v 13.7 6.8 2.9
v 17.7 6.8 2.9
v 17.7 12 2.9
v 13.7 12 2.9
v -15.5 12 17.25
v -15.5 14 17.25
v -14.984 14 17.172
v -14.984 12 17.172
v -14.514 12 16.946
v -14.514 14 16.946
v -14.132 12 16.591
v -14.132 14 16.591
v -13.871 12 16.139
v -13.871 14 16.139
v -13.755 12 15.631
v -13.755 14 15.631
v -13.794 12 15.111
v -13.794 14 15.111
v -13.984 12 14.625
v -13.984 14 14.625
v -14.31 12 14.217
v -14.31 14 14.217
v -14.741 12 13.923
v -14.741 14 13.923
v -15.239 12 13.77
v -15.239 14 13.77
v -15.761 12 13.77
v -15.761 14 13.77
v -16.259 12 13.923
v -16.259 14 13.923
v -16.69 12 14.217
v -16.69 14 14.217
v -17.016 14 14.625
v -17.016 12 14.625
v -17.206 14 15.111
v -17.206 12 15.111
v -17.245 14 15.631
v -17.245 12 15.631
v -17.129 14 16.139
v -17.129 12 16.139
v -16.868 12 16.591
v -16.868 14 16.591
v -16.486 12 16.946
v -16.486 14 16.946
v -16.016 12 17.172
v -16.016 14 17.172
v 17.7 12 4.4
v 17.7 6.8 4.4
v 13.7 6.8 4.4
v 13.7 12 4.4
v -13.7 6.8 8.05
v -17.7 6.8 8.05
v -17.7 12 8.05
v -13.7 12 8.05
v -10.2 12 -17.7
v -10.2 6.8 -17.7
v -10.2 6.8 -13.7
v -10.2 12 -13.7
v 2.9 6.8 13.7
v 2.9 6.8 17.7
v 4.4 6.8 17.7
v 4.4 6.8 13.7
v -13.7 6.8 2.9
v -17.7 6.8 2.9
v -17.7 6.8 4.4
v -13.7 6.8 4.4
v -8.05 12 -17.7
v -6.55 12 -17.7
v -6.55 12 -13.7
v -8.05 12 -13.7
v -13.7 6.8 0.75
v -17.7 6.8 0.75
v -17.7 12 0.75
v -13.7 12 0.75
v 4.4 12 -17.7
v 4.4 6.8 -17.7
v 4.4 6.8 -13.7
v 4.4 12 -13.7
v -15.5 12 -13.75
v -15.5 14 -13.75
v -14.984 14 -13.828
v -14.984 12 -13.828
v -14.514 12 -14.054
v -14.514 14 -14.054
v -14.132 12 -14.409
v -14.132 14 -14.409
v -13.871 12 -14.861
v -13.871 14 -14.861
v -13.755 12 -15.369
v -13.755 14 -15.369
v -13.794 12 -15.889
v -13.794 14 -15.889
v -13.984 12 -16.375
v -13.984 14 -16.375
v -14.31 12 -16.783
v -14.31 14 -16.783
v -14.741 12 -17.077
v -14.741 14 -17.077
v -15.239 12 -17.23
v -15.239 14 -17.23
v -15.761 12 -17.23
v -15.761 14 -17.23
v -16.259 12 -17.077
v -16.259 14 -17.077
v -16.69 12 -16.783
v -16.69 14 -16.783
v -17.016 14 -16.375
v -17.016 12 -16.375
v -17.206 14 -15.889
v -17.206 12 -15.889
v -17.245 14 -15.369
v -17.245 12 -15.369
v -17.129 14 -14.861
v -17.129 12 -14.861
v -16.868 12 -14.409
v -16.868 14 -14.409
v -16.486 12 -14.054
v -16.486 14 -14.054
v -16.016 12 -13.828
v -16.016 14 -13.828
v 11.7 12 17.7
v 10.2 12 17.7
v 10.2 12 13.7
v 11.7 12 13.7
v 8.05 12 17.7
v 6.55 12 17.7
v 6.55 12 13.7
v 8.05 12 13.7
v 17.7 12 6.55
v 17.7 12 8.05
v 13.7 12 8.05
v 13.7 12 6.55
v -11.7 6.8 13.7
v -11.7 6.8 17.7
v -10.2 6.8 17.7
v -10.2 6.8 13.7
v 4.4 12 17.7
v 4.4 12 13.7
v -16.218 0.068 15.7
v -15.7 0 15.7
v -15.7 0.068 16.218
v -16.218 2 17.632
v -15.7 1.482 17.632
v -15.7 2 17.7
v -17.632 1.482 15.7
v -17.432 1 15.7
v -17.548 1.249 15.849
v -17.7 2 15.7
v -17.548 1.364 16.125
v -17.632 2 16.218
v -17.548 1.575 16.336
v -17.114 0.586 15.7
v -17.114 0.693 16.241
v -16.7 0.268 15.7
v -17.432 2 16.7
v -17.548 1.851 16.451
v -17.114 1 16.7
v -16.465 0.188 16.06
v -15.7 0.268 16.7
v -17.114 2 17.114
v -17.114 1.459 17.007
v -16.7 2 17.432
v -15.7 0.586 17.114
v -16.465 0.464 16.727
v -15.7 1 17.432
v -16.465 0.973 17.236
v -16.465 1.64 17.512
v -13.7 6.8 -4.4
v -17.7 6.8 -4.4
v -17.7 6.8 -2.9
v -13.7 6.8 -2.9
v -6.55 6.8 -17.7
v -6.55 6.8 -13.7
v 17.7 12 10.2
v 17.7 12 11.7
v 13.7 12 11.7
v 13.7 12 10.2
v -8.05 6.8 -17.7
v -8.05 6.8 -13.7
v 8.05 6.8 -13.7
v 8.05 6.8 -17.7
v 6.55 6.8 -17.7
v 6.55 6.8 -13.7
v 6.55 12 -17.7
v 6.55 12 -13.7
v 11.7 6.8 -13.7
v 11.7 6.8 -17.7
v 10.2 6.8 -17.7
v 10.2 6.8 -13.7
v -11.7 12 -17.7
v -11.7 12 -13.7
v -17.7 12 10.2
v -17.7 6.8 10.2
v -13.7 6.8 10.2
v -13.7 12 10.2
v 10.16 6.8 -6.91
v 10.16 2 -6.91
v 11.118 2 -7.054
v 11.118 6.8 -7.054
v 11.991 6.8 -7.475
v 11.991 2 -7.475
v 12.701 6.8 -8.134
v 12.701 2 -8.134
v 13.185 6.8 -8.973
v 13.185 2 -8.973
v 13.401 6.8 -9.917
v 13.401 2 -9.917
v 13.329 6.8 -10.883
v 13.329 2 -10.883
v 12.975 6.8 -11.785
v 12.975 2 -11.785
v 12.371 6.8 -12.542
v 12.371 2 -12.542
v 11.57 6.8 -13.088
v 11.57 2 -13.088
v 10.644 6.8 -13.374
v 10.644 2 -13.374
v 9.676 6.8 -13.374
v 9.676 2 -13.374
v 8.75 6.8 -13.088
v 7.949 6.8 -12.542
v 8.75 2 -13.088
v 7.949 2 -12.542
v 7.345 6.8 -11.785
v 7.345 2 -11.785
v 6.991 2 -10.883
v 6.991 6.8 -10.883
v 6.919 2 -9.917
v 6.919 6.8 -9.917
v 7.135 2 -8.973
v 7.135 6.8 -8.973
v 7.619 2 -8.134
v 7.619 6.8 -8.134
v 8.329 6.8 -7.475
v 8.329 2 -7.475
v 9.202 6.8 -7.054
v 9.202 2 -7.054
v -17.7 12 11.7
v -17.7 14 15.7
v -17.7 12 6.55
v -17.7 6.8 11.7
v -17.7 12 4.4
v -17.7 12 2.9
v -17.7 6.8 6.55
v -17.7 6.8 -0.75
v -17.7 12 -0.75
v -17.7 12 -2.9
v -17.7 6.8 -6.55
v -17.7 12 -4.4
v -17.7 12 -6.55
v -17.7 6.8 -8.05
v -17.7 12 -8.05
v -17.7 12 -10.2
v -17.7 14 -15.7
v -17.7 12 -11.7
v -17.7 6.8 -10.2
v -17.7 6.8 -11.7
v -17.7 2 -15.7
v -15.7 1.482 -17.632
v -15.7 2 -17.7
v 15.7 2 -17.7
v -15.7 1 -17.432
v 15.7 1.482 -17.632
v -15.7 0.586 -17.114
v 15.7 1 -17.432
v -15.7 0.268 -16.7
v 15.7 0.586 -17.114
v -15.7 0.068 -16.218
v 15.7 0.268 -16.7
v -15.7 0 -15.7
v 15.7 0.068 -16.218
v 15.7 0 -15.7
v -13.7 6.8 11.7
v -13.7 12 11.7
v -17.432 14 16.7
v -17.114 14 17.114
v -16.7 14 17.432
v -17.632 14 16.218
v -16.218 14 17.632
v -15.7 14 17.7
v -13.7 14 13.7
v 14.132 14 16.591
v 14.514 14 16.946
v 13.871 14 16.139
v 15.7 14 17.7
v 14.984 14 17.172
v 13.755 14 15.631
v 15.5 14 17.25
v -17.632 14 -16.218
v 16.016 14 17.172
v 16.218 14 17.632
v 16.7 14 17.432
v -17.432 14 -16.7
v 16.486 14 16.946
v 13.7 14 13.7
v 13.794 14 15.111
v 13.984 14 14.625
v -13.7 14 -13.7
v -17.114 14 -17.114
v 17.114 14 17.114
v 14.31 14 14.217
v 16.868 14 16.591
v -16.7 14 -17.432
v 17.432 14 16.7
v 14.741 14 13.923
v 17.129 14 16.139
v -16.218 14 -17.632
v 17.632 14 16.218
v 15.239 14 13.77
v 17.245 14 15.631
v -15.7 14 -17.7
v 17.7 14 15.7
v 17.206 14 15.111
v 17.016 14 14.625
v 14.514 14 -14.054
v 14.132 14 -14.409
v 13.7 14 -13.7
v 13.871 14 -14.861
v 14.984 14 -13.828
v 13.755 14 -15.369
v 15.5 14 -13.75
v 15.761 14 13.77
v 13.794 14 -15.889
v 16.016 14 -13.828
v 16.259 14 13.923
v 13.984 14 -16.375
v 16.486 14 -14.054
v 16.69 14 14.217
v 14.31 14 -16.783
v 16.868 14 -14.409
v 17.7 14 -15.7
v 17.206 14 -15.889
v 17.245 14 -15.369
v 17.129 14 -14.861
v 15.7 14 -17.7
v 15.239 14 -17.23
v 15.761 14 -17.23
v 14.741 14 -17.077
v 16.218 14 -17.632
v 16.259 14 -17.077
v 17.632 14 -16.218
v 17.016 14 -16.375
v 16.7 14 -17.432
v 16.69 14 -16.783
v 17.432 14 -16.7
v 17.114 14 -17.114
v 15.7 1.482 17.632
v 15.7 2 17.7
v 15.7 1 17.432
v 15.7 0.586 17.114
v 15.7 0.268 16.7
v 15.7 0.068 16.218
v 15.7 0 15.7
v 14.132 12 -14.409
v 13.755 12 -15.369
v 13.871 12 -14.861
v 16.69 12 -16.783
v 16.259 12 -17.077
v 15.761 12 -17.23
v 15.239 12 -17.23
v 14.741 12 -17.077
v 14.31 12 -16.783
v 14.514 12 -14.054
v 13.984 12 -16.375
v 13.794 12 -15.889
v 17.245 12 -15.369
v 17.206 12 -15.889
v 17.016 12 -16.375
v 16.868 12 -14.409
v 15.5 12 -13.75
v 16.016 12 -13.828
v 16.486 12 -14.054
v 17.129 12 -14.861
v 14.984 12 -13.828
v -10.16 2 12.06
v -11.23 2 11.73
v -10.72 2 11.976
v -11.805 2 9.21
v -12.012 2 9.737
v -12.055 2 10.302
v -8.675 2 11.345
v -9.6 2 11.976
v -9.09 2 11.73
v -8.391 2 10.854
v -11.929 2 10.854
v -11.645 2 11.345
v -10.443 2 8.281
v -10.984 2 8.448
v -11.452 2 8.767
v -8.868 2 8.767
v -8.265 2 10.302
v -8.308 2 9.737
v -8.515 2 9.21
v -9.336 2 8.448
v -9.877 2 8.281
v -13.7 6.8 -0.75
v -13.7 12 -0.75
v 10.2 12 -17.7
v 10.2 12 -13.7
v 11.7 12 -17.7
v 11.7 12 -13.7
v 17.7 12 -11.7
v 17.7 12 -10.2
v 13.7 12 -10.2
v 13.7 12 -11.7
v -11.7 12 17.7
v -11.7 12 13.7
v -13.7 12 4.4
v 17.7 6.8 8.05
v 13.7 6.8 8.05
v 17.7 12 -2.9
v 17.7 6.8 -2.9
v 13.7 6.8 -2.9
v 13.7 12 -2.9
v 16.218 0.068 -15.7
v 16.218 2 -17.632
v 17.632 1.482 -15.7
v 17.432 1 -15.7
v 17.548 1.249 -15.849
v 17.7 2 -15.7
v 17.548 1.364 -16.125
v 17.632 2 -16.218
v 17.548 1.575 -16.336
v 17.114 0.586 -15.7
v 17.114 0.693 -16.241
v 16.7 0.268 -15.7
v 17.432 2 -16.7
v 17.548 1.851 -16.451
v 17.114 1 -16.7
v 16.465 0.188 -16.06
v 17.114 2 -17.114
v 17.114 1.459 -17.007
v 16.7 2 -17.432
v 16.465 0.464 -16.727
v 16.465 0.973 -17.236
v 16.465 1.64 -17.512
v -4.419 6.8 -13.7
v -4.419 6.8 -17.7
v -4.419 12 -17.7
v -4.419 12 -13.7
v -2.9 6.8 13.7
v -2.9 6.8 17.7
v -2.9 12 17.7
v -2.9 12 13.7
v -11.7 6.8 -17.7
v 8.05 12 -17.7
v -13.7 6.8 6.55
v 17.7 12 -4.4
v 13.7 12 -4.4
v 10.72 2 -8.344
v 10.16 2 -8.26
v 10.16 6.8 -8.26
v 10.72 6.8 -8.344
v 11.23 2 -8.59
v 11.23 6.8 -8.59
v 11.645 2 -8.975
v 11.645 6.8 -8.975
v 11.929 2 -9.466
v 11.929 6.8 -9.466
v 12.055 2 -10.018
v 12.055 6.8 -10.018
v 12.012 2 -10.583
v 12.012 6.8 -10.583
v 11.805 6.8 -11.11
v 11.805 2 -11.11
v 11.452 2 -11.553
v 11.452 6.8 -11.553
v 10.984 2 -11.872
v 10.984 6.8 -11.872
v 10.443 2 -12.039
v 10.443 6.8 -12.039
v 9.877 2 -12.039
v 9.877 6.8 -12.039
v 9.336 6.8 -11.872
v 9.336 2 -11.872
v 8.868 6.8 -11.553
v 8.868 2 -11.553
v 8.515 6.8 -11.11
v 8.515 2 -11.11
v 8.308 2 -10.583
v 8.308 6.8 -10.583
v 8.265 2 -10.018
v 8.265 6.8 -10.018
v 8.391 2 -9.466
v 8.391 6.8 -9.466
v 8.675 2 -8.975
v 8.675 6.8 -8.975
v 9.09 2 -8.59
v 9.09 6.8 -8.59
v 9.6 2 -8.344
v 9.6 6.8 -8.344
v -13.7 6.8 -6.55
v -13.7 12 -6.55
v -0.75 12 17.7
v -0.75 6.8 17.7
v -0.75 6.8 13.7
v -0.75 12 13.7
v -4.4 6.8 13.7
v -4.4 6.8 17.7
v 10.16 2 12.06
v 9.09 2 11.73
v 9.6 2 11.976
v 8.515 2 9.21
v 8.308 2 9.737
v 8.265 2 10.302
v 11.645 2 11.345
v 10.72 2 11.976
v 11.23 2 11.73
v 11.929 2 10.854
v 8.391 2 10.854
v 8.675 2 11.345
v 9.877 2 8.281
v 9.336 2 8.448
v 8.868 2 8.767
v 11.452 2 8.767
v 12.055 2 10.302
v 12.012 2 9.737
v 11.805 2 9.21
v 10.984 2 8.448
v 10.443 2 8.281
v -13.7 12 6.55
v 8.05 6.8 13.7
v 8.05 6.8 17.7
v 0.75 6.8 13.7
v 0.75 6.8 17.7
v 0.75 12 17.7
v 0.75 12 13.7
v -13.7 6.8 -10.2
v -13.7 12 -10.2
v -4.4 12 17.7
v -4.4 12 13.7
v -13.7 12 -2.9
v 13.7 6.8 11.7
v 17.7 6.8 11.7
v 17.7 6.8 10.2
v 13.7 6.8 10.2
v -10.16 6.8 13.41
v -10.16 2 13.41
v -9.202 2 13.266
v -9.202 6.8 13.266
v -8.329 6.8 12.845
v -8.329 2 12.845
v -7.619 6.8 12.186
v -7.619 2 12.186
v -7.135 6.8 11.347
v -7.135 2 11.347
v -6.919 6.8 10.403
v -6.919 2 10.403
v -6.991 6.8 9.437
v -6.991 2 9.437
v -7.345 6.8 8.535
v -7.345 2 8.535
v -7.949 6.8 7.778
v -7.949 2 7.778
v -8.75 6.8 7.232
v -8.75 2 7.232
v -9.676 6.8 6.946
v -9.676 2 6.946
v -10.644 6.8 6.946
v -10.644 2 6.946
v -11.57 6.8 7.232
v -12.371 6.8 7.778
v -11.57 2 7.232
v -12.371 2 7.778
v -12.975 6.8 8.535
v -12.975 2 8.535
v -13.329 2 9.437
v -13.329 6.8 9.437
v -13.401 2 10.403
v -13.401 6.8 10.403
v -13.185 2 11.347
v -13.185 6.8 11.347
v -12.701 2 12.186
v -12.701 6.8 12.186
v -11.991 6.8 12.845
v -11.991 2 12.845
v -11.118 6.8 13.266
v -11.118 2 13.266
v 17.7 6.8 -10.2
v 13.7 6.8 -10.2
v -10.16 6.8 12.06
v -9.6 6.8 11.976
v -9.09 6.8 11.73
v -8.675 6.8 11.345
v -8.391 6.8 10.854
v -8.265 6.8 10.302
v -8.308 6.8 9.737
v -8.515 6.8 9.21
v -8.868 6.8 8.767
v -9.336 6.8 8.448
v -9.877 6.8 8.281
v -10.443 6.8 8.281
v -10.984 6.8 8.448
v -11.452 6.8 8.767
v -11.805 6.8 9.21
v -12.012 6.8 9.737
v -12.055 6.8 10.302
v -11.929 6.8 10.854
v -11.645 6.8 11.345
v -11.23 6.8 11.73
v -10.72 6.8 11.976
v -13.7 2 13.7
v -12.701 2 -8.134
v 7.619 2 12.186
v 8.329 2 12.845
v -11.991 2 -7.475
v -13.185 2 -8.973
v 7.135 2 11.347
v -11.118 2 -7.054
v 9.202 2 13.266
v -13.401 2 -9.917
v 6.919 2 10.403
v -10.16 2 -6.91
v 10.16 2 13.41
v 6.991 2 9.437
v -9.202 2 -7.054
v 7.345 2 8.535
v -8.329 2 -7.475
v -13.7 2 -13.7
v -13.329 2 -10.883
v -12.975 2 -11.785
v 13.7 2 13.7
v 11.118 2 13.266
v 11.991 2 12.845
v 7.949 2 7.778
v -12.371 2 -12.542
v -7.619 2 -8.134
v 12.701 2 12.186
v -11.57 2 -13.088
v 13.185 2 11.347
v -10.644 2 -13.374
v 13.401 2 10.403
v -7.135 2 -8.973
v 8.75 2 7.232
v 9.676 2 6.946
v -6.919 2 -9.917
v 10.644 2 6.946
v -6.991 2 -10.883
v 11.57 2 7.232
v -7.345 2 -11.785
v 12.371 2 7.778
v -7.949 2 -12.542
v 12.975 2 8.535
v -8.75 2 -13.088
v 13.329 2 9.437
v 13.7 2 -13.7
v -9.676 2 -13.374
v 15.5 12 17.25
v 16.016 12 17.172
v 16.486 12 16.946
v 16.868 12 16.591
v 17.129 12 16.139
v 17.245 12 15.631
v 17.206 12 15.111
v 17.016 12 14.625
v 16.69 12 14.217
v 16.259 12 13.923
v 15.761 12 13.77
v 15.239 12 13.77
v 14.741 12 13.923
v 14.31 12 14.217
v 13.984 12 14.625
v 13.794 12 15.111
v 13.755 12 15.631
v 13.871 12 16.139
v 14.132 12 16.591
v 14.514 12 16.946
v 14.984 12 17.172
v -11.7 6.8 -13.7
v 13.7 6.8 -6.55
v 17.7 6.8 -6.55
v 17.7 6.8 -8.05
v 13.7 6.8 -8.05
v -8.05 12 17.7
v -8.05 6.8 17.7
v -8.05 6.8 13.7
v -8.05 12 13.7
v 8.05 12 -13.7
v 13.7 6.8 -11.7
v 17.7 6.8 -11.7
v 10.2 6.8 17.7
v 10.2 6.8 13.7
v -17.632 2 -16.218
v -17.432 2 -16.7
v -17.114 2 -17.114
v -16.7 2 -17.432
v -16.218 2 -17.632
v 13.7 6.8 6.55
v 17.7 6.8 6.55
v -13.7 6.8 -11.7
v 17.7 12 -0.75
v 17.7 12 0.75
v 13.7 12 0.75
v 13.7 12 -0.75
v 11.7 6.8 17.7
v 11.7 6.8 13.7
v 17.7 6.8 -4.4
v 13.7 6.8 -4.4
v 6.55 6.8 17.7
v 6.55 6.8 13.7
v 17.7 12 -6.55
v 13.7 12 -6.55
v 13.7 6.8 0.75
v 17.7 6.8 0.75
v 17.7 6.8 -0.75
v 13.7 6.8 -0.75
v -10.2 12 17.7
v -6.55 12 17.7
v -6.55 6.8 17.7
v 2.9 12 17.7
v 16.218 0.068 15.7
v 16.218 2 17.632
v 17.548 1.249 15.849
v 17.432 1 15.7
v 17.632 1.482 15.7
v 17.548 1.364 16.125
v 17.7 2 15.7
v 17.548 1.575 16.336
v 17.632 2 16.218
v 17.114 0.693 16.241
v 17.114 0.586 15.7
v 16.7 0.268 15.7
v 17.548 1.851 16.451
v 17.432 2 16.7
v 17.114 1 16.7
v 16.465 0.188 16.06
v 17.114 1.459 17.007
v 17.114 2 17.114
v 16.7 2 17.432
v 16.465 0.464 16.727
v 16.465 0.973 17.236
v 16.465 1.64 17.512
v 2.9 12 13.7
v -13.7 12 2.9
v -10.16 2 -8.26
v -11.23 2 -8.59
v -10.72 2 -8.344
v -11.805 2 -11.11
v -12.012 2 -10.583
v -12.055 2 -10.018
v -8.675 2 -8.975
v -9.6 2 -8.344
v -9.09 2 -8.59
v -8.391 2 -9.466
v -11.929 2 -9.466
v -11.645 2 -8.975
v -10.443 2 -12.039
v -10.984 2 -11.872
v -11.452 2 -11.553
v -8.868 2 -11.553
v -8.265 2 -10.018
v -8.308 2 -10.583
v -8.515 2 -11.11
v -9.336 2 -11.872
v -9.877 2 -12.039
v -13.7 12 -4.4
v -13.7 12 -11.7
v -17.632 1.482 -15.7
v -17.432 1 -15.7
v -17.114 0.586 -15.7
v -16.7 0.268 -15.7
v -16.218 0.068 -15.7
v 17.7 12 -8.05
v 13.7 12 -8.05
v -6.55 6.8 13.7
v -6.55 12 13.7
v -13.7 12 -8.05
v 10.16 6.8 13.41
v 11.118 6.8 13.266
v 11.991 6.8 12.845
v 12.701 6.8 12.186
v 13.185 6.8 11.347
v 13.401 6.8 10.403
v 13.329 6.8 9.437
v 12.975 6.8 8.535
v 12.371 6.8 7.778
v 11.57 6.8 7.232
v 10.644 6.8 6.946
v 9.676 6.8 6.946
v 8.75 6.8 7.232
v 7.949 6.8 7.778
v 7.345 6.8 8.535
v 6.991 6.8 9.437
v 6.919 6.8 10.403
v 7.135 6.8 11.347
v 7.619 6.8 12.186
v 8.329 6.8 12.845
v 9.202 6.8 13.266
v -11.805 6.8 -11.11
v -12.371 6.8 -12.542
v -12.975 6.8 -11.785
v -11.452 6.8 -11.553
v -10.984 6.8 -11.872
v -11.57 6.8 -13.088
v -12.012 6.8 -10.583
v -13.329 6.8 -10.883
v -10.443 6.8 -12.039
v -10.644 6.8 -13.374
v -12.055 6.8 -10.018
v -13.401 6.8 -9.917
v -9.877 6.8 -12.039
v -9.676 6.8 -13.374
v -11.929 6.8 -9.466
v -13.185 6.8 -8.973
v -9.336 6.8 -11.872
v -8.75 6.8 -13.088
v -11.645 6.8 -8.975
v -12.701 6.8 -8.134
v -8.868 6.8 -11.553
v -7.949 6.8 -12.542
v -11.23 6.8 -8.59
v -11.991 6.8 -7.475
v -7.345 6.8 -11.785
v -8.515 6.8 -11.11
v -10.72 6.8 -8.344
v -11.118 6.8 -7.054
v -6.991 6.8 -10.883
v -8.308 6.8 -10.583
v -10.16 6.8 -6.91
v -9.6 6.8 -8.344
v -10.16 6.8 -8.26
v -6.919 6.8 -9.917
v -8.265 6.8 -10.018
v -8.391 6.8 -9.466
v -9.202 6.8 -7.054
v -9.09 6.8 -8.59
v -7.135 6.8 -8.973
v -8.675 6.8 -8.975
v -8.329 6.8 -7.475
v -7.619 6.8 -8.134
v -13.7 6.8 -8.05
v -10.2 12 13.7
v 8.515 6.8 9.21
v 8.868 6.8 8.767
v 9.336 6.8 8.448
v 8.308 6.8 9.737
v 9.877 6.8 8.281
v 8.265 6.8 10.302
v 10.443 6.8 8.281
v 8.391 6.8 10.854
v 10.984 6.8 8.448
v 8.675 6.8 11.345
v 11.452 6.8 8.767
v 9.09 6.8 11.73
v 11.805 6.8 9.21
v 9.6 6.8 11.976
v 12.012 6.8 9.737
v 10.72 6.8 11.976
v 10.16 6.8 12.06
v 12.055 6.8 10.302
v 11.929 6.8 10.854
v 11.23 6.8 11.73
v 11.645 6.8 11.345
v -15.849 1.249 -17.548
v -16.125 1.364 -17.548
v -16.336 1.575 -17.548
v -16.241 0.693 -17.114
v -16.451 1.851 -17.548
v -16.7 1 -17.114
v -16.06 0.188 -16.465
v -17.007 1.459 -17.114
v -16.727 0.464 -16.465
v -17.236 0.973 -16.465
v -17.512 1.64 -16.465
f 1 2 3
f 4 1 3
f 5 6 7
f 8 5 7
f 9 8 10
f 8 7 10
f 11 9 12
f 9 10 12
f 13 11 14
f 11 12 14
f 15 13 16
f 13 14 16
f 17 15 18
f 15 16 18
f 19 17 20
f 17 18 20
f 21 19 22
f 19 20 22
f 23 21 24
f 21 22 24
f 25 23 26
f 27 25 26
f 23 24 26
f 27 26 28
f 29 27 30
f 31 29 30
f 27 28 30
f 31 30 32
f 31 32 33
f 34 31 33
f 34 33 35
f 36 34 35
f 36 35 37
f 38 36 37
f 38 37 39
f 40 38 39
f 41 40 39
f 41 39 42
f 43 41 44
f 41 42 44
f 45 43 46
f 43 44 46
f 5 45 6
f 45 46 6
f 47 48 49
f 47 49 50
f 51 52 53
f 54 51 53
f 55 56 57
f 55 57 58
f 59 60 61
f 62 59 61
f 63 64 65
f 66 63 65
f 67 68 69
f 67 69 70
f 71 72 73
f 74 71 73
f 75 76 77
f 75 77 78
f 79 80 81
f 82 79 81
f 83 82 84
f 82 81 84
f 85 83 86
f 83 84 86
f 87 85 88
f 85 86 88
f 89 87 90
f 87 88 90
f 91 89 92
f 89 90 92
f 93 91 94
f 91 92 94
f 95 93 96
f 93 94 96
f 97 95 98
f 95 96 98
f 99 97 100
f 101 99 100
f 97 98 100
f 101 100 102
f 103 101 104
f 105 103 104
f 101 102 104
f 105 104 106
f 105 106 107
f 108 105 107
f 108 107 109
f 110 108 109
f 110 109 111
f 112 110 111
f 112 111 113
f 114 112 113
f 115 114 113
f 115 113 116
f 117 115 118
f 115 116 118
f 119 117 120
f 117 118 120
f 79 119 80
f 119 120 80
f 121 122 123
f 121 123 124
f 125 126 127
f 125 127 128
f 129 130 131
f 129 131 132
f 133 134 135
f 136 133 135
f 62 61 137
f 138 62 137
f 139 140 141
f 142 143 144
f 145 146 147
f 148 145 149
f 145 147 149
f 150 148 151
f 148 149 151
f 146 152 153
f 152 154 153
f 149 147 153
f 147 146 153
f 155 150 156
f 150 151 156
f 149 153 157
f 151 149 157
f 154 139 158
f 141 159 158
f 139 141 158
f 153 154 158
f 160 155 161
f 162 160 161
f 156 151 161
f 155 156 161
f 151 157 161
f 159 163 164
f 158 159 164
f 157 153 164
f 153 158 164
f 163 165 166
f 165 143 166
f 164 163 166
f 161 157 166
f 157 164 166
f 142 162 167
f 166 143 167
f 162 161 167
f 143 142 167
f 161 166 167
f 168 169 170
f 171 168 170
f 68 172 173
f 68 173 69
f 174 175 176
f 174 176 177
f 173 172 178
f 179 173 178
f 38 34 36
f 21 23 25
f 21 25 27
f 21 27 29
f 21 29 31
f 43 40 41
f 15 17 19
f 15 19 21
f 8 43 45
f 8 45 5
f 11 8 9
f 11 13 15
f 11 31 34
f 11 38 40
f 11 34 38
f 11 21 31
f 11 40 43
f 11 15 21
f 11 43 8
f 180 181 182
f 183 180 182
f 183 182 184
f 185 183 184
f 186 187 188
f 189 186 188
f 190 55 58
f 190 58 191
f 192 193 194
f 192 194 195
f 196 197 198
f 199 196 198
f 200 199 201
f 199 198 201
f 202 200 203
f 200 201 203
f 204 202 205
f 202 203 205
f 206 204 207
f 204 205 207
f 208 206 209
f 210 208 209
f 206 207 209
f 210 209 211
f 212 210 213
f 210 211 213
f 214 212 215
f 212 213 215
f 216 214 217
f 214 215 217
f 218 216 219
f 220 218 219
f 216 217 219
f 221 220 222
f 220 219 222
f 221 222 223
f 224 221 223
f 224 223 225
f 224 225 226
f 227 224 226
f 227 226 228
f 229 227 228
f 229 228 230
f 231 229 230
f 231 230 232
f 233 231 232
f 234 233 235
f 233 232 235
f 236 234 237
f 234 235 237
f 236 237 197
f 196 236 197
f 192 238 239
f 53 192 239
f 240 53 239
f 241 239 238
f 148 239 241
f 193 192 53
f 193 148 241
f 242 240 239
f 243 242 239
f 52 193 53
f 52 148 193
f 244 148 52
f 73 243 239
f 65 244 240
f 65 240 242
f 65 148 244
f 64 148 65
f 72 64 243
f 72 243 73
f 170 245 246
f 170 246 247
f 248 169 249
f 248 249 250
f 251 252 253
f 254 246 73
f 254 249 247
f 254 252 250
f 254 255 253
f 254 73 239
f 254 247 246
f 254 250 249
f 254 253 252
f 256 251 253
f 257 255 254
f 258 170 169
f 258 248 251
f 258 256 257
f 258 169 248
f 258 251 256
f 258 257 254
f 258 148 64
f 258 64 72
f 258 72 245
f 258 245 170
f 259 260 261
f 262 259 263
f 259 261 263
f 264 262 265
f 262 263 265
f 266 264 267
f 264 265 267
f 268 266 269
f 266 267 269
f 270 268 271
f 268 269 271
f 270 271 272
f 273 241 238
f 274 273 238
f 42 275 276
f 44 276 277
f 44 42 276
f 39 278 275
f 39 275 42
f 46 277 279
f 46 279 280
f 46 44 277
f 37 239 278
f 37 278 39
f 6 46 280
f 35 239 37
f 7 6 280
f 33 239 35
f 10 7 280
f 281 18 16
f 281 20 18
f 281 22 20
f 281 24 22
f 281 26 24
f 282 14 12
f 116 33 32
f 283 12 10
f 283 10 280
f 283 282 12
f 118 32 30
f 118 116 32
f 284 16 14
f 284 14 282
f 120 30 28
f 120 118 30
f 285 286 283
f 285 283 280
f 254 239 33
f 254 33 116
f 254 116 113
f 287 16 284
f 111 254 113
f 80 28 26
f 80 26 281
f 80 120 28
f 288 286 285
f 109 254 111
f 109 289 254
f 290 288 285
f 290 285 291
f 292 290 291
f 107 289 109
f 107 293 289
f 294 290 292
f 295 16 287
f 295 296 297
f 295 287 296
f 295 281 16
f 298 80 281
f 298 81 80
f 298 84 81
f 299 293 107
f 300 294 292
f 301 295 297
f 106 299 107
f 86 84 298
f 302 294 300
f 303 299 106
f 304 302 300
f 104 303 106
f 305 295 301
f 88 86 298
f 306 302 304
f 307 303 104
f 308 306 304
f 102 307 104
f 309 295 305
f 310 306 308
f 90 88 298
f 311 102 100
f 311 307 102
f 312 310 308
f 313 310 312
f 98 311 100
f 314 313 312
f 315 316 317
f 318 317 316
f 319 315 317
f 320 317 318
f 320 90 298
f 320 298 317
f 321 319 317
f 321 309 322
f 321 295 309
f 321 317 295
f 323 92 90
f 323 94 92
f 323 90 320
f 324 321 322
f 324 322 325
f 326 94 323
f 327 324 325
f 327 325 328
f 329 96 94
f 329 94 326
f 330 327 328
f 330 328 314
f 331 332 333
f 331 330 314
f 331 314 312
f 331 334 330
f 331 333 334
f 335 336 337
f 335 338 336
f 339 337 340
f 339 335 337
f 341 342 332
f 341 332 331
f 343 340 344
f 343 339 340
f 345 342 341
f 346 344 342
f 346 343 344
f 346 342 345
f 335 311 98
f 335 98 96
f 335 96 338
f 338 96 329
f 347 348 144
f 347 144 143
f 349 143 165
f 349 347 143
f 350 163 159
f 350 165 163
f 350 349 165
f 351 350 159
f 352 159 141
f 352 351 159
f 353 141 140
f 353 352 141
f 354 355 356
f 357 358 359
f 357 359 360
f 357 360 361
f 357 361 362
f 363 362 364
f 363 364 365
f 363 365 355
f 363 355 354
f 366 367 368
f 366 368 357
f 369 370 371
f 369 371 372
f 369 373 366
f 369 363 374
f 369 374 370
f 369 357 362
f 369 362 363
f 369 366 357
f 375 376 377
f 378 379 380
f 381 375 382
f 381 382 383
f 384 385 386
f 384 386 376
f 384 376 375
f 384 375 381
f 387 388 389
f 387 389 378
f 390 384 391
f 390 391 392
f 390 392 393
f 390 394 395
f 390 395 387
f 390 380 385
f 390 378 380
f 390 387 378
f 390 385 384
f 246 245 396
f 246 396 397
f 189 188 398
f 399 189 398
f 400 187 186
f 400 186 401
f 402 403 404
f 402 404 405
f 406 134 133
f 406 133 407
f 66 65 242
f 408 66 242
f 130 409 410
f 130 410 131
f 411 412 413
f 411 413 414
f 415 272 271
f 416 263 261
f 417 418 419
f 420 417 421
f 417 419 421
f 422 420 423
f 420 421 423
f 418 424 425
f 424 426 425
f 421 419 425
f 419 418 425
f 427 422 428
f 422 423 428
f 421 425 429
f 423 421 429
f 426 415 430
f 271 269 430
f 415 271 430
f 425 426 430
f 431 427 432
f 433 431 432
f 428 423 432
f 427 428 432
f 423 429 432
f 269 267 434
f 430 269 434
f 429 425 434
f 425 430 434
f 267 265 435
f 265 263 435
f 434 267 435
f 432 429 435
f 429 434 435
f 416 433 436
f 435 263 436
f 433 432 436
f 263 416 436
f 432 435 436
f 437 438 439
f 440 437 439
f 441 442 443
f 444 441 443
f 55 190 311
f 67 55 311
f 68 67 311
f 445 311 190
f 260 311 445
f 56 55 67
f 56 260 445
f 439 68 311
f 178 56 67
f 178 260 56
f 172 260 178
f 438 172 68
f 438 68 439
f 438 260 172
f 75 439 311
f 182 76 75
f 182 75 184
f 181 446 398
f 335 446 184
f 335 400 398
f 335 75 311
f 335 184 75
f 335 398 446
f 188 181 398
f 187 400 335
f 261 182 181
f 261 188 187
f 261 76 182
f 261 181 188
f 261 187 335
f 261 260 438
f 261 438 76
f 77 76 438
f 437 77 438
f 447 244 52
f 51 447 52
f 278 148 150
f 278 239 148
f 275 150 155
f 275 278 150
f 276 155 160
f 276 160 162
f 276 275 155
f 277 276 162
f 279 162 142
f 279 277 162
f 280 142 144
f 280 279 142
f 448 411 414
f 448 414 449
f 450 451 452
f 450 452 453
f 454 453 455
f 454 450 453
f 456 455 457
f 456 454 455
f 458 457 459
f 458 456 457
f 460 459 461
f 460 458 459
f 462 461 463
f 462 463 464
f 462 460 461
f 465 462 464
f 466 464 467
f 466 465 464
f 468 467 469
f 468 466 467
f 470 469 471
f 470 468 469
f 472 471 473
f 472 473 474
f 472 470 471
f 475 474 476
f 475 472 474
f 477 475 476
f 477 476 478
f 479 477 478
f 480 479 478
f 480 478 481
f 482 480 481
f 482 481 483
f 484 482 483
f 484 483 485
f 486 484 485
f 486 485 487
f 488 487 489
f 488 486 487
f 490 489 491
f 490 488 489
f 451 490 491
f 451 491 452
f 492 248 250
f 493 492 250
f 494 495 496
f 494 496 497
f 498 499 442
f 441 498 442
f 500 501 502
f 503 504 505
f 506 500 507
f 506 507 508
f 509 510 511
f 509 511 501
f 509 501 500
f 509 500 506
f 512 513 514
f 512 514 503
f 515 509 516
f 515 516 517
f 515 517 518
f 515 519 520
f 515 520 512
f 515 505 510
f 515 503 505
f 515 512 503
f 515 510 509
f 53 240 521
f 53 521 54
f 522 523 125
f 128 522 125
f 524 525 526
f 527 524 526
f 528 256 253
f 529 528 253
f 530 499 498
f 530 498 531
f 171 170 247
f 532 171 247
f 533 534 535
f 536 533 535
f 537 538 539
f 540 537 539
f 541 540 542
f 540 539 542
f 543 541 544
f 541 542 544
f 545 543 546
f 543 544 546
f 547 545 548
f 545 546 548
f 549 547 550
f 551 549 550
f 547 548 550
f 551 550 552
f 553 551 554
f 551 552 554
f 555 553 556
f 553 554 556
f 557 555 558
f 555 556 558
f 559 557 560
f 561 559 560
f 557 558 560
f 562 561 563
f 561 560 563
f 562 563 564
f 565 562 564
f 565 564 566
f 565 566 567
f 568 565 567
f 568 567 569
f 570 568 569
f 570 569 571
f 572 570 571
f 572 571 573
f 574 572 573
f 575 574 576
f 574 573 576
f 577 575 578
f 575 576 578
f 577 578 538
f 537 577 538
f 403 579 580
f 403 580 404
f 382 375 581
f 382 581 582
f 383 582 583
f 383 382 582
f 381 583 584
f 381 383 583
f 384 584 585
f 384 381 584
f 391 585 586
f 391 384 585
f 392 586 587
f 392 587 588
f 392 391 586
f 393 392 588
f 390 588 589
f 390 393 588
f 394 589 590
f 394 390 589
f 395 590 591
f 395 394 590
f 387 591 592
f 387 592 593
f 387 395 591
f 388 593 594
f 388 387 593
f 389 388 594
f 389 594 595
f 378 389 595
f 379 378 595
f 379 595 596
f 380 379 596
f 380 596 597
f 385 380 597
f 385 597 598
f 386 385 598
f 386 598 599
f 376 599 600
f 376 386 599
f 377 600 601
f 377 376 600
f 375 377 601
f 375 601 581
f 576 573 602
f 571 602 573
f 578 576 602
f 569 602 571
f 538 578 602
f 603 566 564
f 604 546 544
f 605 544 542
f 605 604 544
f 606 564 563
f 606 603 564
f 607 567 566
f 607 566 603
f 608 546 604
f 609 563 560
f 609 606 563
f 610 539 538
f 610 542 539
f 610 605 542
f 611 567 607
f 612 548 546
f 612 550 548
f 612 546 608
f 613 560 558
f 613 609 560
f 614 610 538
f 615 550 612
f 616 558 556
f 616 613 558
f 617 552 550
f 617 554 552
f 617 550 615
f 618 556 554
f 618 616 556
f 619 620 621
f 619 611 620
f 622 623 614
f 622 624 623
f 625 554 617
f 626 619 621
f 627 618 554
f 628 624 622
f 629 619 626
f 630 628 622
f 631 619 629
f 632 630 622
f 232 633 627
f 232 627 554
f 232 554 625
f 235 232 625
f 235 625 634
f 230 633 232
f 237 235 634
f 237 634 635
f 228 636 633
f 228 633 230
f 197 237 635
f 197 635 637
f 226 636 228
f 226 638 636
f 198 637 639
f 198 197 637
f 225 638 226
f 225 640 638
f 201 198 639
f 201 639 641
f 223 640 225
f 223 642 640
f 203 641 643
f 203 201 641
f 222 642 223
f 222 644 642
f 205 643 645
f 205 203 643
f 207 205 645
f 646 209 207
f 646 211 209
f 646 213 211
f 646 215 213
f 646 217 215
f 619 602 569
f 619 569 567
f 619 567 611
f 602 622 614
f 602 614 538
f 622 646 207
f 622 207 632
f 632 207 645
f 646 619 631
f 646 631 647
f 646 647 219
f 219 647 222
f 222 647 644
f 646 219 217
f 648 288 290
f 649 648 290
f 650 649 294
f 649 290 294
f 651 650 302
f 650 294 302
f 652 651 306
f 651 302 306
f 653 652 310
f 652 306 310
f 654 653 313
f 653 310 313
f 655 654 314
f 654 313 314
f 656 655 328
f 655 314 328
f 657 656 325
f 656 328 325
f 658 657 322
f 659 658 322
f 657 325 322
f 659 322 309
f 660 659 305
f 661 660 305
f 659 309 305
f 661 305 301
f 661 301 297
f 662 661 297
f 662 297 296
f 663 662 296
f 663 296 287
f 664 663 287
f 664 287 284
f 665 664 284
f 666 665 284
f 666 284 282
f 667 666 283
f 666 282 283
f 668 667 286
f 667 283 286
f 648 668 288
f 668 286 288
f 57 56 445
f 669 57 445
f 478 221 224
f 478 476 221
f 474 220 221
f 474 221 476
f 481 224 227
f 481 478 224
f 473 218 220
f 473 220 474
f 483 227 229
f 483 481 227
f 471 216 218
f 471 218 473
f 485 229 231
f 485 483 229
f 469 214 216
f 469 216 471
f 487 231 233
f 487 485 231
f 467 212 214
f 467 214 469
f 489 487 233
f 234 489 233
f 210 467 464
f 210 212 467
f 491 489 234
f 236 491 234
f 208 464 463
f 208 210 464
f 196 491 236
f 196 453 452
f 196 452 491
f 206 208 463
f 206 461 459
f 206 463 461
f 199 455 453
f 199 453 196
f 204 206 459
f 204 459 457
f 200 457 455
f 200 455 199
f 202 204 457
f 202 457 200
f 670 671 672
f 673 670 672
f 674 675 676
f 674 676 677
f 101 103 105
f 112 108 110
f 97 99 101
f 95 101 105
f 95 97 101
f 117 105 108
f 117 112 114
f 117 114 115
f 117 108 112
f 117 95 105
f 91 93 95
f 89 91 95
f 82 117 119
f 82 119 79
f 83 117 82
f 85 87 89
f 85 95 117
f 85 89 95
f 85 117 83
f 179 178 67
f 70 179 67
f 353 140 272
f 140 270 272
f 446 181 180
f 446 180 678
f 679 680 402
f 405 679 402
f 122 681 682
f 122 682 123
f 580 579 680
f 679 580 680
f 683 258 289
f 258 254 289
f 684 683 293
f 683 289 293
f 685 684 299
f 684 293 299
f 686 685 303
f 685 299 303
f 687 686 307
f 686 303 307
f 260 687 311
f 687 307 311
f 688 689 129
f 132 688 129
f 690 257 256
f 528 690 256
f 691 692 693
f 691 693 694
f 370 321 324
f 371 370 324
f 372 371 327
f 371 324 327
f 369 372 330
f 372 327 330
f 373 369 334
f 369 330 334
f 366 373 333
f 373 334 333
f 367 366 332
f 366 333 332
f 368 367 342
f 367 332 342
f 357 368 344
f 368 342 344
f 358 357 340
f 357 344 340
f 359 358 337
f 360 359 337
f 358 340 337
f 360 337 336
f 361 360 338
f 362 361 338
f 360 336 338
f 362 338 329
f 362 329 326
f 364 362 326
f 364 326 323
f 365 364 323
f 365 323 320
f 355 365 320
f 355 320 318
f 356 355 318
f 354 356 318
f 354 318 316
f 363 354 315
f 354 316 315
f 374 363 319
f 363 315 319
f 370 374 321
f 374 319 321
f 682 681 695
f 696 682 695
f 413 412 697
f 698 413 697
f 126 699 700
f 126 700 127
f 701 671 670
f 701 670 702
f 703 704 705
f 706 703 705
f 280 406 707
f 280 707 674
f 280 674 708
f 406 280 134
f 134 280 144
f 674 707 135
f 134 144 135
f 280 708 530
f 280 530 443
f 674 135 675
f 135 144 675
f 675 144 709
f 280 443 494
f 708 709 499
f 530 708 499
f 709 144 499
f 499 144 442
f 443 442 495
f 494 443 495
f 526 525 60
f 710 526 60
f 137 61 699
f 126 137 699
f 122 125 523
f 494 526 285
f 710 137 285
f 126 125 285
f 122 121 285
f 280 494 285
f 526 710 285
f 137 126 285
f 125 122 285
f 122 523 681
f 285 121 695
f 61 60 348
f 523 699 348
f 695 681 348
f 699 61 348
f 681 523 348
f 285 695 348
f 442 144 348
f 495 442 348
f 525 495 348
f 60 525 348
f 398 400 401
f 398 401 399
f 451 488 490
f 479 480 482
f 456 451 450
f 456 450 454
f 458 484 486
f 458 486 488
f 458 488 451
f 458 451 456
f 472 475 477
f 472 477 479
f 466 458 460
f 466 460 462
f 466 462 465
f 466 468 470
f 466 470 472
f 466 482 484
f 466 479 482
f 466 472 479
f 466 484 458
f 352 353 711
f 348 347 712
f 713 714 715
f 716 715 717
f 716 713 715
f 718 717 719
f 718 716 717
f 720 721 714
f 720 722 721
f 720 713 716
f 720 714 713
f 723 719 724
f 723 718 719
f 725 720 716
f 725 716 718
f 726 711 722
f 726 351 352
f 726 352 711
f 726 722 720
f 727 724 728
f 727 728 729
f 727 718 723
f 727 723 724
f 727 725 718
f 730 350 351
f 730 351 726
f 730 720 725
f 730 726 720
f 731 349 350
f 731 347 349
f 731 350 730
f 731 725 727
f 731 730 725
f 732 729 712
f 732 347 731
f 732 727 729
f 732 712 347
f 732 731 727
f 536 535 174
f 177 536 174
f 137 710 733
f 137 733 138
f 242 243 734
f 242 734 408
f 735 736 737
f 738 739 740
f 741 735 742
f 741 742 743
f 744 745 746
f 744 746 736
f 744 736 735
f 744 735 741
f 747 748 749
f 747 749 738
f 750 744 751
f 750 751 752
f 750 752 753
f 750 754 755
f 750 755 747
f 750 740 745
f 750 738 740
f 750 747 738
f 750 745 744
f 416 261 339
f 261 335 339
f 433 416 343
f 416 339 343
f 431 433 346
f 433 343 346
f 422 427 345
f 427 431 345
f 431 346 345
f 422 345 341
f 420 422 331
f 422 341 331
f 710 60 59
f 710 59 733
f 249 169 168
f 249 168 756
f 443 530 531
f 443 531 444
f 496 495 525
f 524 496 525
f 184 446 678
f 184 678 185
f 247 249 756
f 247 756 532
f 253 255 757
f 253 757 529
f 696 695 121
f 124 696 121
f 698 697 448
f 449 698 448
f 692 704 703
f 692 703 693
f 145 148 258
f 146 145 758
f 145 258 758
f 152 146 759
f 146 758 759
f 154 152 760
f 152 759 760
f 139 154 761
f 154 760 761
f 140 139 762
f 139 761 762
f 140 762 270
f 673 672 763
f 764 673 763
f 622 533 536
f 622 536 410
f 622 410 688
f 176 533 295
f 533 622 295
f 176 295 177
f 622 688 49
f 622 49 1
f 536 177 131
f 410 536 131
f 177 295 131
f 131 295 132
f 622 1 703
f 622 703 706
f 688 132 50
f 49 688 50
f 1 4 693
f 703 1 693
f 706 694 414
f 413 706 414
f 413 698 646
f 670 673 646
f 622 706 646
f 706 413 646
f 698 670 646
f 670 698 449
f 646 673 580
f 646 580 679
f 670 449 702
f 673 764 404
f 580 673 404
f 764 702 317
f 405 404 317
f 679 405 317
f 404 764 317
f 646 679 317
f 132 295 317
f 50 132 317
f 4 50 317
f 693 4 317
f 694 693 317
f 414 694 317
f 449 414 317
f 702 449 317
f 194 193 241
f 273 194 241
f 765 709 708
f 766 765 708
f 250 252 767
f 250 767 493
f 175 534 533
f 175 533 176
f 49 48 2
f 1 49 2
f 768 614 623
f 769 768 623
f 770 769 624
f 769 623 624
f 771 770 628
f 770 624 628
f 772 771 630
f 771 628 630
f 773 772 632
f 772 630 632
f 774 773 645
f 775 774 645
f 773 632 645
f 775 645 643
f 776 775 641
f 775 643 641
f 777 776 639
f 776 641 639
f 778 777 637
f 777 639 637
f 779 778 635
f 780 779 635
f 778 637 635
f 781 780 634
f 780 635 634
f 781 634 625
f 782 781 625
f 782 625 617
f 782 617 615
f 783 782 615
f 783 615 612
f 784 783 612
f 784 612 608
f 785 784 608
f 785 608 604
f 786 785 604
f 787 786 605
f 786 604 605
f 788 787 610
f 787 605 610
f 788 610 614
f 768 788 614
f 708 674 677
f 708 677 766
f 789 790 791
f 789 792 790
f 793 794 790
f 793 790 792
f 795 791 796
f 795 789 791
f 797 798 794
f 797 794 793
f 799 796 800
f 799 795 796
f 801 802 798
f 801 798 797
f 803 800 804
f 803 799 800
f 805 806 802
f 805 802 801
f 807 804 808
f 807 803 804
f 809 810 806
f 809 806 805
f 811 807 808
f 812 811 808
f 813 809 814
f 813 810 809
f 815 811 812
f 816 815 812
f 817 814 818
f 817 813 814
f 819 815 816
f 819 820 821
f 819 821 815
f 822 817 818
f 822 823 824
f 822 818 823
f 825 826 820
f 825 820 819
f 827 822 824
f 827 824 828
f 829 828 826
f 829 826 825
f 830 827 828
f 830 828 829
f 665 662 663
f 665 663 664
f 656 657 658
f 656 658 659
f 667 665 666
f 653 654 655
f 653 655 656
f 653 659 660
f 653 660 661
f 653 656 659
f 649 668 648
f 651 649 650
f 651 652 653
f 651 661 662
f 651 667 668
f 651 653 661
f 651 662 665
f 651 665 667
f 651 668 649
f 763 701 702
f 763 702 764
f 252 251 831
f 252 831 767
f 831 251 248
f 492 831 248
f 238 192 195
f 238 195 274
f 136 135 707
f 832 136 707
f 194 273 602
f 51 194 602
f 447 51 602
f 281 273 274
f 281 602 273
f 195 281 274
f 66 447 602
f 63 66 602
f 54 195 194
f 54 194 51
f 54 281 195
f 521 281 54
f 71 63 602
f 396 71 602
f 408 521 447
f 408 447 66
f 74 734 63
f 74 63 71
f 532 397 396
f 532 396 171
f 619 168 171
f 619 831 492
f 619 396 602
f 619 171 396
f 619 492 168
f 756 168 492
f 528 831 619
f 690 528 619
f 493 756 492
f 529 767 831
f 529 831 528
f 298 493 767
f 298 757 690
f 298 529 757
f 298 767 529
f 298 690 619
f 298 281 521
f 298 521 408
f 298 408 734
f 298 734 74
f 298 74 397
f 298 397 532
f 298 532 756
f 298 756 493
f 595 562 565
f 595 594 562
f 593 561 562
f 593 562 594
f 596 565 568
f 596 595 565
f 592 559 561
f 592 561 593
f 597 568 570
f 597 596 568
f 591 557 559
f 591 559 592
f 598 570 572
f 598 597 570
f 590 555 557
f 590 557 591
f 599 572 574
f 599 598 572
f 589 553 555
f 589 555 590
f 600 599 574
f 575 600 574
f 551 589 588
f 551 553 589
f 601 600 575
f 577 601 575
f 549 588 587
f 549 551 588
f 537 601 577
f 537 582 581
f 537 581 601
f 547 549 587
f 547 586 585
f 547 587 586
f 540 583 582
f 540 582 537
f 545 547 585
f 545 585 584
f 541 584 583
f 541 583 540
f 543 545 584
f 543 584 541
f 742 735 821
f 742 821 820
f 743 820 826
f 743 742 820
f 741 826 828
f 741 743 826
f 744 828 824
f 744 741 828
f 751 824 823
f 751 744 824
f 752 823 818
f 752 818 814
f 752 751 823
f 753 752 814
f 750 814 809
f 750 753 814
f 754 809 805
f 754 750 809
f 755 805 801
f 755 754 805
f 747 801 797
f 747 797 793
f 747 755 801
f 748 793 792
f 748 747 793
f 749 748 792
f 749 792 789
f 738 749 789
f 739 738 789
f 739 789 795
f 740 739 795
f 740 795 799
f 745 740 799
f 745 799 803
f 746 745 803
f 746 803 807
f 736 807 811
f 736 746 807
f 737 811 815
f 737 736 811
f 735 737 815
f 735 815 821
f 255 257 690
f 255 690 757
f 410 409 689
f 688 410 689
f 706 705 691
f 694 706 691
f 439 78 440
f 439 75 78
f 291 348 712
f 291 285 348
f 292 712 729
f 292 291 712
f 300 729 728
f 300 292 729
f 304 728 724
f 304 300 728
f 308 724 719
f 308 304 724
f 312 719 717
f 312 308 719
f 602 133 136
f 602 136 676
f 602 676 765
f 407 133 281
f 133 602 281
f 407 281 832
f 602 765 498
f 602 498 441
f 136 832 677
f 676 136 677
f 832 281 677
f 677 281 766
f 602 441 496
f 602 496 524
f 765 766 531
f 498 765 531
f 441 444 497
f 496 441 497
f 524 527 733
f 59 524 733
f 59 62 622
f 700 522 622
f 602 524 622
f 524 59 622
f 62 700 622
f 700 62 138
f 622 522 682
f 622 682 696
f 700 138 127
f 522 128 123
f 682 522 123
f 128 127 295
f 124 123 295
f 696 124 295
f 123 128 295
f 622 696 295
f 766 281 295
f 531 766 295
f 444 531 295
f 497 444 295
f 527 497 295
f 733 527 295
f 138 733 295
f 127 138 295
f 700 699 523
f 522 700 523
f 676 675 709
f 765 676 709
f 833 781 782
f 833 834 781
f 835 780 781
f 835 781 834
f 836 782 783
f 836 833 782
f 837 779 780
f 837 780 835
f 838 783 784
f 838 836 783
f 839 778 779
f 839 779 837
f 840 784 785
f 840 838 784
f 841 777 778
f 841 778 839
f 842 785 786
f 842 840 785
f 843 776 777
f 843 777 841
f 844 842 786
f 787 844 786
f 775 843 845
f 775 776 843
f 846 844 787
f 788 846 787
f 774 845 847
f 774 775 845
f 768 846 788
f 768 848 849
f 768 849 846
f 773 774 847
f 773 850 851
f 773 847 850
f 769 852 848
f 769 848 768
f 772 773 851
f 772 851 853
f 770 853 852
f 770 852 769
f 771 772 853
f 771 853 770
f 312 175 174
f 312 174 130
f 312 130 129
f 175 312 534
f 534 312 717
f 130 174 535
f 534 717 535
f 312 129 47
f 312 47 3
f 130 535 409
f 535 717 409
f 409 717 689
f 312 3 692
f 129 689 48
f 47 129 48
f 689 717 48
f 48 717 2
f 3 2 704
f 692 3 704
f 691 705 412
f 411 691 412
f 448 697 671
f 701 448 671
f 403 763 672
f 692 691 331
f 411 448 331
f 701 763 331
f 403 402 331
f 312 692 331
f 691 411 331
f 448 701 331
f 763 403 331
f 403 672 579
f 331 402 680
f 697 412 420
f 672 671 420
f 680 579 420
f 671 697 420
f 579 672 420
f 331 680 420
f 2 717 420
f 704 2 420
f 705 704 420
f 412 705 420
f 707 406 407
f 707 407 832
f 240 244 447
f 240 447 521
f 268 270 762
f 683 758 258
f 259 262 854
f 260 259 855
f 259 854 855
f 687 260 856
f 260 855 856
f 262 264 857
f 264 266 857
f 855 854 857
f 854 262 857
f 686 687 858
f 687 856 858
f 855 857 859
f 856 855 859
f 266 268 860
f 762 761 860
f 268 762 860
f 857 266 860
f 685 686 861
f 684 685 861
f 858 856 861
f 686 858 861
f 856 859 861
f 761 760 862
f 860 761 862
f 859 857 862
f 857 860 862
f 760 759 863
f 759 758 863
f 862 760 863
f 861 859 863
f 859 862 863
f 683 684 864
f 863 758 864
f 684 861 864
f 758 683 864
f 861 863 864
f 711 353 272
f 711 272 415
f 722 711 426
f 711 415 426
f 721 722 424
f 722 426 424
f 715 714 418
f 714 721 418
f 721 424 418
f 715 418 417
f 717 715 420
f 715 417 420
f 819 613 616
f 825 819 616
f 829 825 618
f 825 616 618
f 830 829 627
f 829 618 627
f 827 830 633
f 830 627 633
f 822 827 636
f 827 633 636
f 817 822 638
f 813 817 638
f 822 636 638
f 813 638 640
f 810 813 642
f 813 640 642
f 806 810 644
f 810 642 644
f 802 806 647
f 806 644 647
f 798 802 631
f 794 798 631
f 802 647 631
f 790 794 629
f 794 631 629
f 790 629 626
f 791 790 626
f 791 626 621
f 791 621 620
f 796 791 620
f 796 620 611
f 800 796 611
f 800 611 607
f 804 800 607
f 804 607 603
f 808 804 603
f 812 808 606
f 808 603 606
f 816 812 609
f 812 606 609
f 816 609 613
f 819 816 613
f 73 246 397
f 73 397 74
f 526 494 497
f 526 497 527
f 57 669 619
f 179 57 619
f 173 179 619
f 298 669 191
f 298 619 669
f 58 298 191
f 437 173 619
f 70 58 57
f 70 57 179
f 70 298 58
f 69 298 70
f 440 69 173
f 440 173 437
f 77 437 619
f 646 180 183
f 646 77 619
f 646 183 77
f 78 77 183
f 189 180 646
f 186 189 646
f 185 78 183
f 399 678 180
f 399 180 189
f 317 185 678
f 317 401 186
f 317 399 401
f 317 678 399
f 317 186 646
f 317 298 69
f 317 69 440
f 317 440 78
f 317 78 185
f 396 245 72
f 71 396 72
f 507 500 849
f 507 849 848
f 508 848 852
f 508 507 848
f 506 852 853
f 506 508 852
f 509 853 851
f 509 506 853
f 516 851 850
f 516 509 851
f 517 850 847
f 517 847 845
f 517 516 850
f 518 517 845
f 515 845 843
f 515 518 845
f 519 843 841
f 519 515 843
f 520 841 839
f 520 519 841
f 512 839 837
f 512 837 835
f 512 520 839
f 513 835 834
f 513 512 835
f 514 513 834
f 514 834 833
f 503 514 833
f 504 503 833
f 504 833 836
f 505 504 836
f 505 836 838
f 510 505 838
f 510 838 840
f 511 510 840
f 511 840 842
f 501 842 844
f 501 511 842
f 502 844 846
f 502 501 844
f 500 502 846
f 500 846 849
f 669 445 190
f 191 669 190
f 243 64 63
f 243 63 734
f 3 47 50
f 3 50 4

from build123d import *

# Parameters (mm, degrees)
ESQUISSE1_W              = 35.4
ESQUISSE1_H              = 35.4
BOSS_EXTRU_1_DEPTH       = 14
ESQUISSE2_W              = 27.4
ESQUISSE2_H              = 27.4
ENL_V_MAT_EXTRU_1_DEPTH  = 12
ESQUISSE4_R              = 3.25
ESQUISSE4_R_2            = 1.9
BOSS_EXTRU_2_DEPTH       = 4.8
ESQUISSE5_R              = 1.75
ENL_V_MAT_EXTRU_2_DEPTH  = 2
CONG_6_R                 = 2
ESQUISSE9_W              = 1.5
ESQUISSE9_H              = 5.2
ENL_V_MAT_EXTRU_9_DEPTH  = 4
ESQUISSE8_W              = 1.5
ESQUISSE8_H              = 5.2
ENL_V_MAT_EXTRU_10_DEPTH = 4
ESQUISSE7_W              = 1.5
ESQUISSE7_H              = 5.2
ENL_V_MAT_EXTRU_11_DEPTH = 4
ESQUISSE6_W              = 1.5
ESQUISSE6_H              = 5.2
ENL_V_MAT_EXTRU_12_DEPTH = 4
ESQUISSE10_W             = 8.819289119
ESQUISSE10_H             = 5.2
ENL_V_MAT_EXTRU_13_DEPTH = 6


with BuildPart() as part:
    # Esquisse1 → Boss.-Extru.1 (new body)
    with BuildSketch(Plane(origin=(0, 0, 0), x_dir=(1, 0, 0), z_dir=(0, 1, 0))):
        Rectangle(ESQUISSE1_W, ESQUISSE1_H)
    extrude(amount=BOSS_EXTRU_1_DEPTH)

    # Esquisse2 → Enlèv. mat.-Extru.1 (cut)
    with BuildSketch(Plane(origin=(0, 14, 0), x_dir=(1, 0, 0), z_dir=(0, 1, 0))):
        Rectangle(ESQUISSE2_W, ESQUISSE2_H)
    extrude(amount=-ENL_V_MAT_EXTRU_1_DEPTH, mode=Mode.SUBTRACT)

    # Esquisse4 → Boss.-Extru.2 (add)
    # profile 1 of 4: a face of its own
    with BuildSketch(Plane(origin=(0, 2, 0), x_dir=(1, 0, 0), z_dir=(0, 1, 0))):
        with Locations(Location((-10.16, 10.16, 0), (0, 0, 270))):
            Circle(ESQUISSE4_R)
        with Locations(Location((-10.16, 10.16, 0), (0, 0, 270))):
            Circle(ESQUISSE4_R_2, mode=Mode.SUBTRACT)
    # profile 2 of 4: a face of its own
    with BuildSketch(Plane(origin=(0, 2, 0), x_dir=(1, 0, 0), z_dir=(0, 1, 0))):
        with Locations(Location((10.16, 10.16, 0), (0, 0, 270))):
            Circle(ESQUISSE4_R)
        with Locations(Location((10.16, 10.16, 0), (0, 0, 270))):
            Circle(ESQUISSE4_R_2, mode=Mode.SUBTRACT)
    # profile 3 of 4: a face of its own
    with BuildSketch(Plane(origin=(0, 2, 0), x_dir=(1, 0, 0), z_dir=(0, 1, 0))):
        with Locations(Location((10.16, -10.16, 0), (0, 0, 270))):
            Circle(ESQUISSE4_R)
        with Locations(Location((10.16, -10.16, 0), (0, 0, 270))):
            Circle(ESQUISSE4_R_2, mode=Mode.SUBTRACT)
    # profile 4 of 4: a face of its own
    with BuildSketch(Plane(origin=(0, 2, 0), x_dir=(1, 0, 0), z_dir=(0, 1, 0))):
        with Locations(Location((-10.16, -10.16, 0), (0, 0, 270))):
            Circle(ESQUISSE4_R)
        with Locations(Location((-10.16, -10.16, 0), (0, 0, 270))):
            Circle(ESQUISSE4_R_2, mode=Mode.SUBTRACT)
    extrude(amount=BOSS_EXTRU_2_DEPTH)

    # Esquisse5 → Enlèv. mat.-Extru.2 (cut)
    with BuildSketch(Plane(origin=(0, 14, 0), x_dir=(1, 0, 0), z_dir=(0, 1, 0))):
        with Locations(Location((15.5, 15.5, 0), (0, 0, 270))):
            Circle(ESQUISSE5_R)
        with Locations(Location((-15.5, 15.5, 0), (0, 0, 270))):
            Circle(ESQUISSE5_R)
        with Locations(Location((-15.5, -15.5, 0), (0, 0, 270))):
            Circle(ESQUISSE5_R)
        with Locations(Location((15.5, -15.5, 0), (0, 0, 270))):
            Circle(ESQUISSE5_R)
    extrude(amount=-ENL_V_MAT_EXTRU_2_DEPTH, mode=Mode.SUBTRACT)

    # Congé6
    cong_6_edges = [part.edges().sort_by_distance(p)[0] for p in [
        (0, 0, 17.7),
        (-17.7, 0, 0),
        (0, 0, -17.7),
        (17.7, 0, 0),
        (17.7, 7, 17.7),
        (-17.7, 7, 17.7),
        (-17.7, 7, -17.7),
        (17.7, 7, -17.7),
    ]]
    fillet(cong_6_edges, radius=CONG_6_R)

    # Esquisse9 → Enlèv. mat.-Extru.9 (cut)
    with BuildSketch(Plane(origin=(0, 0, -17.7), x_dir=(-1, 0, 0), z_dir=(0, 0, -1))):
        with Locations((-10.95, 9.4)):
            Rectangle(ESQUISSE9_W, ESQUISSE9_H)
        with Locations((-7.3, 9.4)):
            Rectangle(ESQUISSE9_W, ESQUISSE9_H)
        with Locations((-3.65, 9.4)):
            Rectangle(ESQUISSE9_W, ESQUISSE9_H)
        with Locations((0, 9.4)):
            Rectangle(ESQUISSE9_W, ESQUISSE9_H)
        with Locations((3.65, 9.4)):
            Rectangle(ESQUISSE9_W, ESQUISSE9_H)
        with Locations((7.3, 9.4)):
            Rectangle(ESQUISSE9_W, ESQUISSE9_H)
        with Locations((10.95, 9.4)):
            Rectangle(ESQUISSE9_W, ESQUISSE9_H)
    extrude(amount=-ENL_V_MAT_EXTRU_9_DEPTH, mode=Mode.SUBTRACT)

    # Esquisse8 → Enlèv. mat.-Extru.10 (cut)
    with BuildSketch(Plane.XY.offset(17.7)):
        with Locations((-10.95, 9.4)):
            Rectangle(ESQUISSE8_W, ESQUISSE8_H)
        with Locations((-7.3, 9.4)):
            Rectangle(ESQUISSE8_W, ESQUISSE8_H)
        with Locations((-3.65, 9.4)):
            Rectangle(ESQUISSE8_W, ESQUISSE8_H)
        with Locations((0, 9.4)):
            Rectangle(ESQUISSE8_W, ESQUISSE8_H)
        with Locations((3.65, 9.4)):
            Rectangle(ESQUISSE8_W, ESQUISSE8_H)
        with Locations((7.3, 9.4)):
            Rectangle(ESQUISSE8_W, ESQUISSE8_H)
        with Locations((10.95, 9.4)):
            Rectangle(ESQUISSE8_W, ESQUISSE8_H)
    extrude(amount=-ENL_V_MAT_EXTRU_10_DEPTH, mode=Mode.SUBTRACT)

    # Esquisse7 → Enlèv. mat.-Extru.11 (cut)
    with BuildSketch(Plane.ZY.offset(17.7)):
        with Locations((-10.95, 9.4)):
            Rectangle(ESQUISSE7_W, ESQUISSE7_H)
        with Locations((-7.3, 9.4)):
            Rectangle(ESQUISSE7_W, ESQUISSE7_H)
        with Locations((-3.65, 9.4)):
            Rectangle(ESQUISSE7_W, ESQUISSE7_H)
        with Locations((0, 9.4)):
            Rectangle(ESQUISSE7_W, ESQUISSE7_H)
        with Locations((3.65, 9.4)):
            Rectangle(ESQUISSE7_W, ESQUISSE7_H)
        with Locations((7.3, 9.4)):
            Rectangle(ESQUISSE7_W, ESQUISSE7_H)
        with Locations((10.95, 9.4)):
            Rectangle(ESQUISSE7_W, ESQUISSE7_H)
    extrude(amount=-ENL_V_MAT_EXTRU_11_DEPTH, mode=Mode.SUBTRACT)

    # Esquisse6 → Enlèv. mat.-Extru.12 (cut)
    with BuildSketch(Plane(origin=(17.7, 0, 0), x_dir=(0, 0, -1), z_dir=(1, 0, 0))):
        with Locations((-10.95, 9.4)):
            Rectangle(ESQUISSE6_W, ESQUISSE6_H)
        with Locations((-7.3, 9.4)):
            Rectangle(ESQUISSE6_W, ESQUISSE6_H)
        with Locations((-3.65, 9.4)):
            Rectangle(ESQUISSE6_W, ESQUISSE6_H)
        with Locations((0, 9.4)):
            Rectangle(ESQUISSE6_W, ESQUISSE6_H)
        with Locations((3.65, 9.4)):
            Rectangle(ESQUISSE6_W, ESQUISSE6_H)
        with Locations((7.3, 9.4)):
            Rectangle(ESQUISSE6_W, ESQUISSE6_H)
        with Locations((10.95, 9.4)):
            Rectangle(ESQUISSE6_W, ESQUISSE6_H)
    extrude(amount=-ENL_V_MAT_EXTRU_12_DEPTH, mode=Mode.SUBTRACT)

    # Esquisse10 → Enlèv. mat.-Extru.13 (cut)
    with BuildSketch(Plane(origin=(0, 0, -17.7), x_dir=(-1, 0, 0), z_dir=(0, 0, -1))):
        with Locations((0.009644559, 9.4)):
            Rectangle(ESQUISSE10_W, ESQUISSE10_H)
    extrude(amount=-ENL_V_MAT_EXTRU_13_DEPTH, mode=Mode.SUBTRACT)


solid = part.part
